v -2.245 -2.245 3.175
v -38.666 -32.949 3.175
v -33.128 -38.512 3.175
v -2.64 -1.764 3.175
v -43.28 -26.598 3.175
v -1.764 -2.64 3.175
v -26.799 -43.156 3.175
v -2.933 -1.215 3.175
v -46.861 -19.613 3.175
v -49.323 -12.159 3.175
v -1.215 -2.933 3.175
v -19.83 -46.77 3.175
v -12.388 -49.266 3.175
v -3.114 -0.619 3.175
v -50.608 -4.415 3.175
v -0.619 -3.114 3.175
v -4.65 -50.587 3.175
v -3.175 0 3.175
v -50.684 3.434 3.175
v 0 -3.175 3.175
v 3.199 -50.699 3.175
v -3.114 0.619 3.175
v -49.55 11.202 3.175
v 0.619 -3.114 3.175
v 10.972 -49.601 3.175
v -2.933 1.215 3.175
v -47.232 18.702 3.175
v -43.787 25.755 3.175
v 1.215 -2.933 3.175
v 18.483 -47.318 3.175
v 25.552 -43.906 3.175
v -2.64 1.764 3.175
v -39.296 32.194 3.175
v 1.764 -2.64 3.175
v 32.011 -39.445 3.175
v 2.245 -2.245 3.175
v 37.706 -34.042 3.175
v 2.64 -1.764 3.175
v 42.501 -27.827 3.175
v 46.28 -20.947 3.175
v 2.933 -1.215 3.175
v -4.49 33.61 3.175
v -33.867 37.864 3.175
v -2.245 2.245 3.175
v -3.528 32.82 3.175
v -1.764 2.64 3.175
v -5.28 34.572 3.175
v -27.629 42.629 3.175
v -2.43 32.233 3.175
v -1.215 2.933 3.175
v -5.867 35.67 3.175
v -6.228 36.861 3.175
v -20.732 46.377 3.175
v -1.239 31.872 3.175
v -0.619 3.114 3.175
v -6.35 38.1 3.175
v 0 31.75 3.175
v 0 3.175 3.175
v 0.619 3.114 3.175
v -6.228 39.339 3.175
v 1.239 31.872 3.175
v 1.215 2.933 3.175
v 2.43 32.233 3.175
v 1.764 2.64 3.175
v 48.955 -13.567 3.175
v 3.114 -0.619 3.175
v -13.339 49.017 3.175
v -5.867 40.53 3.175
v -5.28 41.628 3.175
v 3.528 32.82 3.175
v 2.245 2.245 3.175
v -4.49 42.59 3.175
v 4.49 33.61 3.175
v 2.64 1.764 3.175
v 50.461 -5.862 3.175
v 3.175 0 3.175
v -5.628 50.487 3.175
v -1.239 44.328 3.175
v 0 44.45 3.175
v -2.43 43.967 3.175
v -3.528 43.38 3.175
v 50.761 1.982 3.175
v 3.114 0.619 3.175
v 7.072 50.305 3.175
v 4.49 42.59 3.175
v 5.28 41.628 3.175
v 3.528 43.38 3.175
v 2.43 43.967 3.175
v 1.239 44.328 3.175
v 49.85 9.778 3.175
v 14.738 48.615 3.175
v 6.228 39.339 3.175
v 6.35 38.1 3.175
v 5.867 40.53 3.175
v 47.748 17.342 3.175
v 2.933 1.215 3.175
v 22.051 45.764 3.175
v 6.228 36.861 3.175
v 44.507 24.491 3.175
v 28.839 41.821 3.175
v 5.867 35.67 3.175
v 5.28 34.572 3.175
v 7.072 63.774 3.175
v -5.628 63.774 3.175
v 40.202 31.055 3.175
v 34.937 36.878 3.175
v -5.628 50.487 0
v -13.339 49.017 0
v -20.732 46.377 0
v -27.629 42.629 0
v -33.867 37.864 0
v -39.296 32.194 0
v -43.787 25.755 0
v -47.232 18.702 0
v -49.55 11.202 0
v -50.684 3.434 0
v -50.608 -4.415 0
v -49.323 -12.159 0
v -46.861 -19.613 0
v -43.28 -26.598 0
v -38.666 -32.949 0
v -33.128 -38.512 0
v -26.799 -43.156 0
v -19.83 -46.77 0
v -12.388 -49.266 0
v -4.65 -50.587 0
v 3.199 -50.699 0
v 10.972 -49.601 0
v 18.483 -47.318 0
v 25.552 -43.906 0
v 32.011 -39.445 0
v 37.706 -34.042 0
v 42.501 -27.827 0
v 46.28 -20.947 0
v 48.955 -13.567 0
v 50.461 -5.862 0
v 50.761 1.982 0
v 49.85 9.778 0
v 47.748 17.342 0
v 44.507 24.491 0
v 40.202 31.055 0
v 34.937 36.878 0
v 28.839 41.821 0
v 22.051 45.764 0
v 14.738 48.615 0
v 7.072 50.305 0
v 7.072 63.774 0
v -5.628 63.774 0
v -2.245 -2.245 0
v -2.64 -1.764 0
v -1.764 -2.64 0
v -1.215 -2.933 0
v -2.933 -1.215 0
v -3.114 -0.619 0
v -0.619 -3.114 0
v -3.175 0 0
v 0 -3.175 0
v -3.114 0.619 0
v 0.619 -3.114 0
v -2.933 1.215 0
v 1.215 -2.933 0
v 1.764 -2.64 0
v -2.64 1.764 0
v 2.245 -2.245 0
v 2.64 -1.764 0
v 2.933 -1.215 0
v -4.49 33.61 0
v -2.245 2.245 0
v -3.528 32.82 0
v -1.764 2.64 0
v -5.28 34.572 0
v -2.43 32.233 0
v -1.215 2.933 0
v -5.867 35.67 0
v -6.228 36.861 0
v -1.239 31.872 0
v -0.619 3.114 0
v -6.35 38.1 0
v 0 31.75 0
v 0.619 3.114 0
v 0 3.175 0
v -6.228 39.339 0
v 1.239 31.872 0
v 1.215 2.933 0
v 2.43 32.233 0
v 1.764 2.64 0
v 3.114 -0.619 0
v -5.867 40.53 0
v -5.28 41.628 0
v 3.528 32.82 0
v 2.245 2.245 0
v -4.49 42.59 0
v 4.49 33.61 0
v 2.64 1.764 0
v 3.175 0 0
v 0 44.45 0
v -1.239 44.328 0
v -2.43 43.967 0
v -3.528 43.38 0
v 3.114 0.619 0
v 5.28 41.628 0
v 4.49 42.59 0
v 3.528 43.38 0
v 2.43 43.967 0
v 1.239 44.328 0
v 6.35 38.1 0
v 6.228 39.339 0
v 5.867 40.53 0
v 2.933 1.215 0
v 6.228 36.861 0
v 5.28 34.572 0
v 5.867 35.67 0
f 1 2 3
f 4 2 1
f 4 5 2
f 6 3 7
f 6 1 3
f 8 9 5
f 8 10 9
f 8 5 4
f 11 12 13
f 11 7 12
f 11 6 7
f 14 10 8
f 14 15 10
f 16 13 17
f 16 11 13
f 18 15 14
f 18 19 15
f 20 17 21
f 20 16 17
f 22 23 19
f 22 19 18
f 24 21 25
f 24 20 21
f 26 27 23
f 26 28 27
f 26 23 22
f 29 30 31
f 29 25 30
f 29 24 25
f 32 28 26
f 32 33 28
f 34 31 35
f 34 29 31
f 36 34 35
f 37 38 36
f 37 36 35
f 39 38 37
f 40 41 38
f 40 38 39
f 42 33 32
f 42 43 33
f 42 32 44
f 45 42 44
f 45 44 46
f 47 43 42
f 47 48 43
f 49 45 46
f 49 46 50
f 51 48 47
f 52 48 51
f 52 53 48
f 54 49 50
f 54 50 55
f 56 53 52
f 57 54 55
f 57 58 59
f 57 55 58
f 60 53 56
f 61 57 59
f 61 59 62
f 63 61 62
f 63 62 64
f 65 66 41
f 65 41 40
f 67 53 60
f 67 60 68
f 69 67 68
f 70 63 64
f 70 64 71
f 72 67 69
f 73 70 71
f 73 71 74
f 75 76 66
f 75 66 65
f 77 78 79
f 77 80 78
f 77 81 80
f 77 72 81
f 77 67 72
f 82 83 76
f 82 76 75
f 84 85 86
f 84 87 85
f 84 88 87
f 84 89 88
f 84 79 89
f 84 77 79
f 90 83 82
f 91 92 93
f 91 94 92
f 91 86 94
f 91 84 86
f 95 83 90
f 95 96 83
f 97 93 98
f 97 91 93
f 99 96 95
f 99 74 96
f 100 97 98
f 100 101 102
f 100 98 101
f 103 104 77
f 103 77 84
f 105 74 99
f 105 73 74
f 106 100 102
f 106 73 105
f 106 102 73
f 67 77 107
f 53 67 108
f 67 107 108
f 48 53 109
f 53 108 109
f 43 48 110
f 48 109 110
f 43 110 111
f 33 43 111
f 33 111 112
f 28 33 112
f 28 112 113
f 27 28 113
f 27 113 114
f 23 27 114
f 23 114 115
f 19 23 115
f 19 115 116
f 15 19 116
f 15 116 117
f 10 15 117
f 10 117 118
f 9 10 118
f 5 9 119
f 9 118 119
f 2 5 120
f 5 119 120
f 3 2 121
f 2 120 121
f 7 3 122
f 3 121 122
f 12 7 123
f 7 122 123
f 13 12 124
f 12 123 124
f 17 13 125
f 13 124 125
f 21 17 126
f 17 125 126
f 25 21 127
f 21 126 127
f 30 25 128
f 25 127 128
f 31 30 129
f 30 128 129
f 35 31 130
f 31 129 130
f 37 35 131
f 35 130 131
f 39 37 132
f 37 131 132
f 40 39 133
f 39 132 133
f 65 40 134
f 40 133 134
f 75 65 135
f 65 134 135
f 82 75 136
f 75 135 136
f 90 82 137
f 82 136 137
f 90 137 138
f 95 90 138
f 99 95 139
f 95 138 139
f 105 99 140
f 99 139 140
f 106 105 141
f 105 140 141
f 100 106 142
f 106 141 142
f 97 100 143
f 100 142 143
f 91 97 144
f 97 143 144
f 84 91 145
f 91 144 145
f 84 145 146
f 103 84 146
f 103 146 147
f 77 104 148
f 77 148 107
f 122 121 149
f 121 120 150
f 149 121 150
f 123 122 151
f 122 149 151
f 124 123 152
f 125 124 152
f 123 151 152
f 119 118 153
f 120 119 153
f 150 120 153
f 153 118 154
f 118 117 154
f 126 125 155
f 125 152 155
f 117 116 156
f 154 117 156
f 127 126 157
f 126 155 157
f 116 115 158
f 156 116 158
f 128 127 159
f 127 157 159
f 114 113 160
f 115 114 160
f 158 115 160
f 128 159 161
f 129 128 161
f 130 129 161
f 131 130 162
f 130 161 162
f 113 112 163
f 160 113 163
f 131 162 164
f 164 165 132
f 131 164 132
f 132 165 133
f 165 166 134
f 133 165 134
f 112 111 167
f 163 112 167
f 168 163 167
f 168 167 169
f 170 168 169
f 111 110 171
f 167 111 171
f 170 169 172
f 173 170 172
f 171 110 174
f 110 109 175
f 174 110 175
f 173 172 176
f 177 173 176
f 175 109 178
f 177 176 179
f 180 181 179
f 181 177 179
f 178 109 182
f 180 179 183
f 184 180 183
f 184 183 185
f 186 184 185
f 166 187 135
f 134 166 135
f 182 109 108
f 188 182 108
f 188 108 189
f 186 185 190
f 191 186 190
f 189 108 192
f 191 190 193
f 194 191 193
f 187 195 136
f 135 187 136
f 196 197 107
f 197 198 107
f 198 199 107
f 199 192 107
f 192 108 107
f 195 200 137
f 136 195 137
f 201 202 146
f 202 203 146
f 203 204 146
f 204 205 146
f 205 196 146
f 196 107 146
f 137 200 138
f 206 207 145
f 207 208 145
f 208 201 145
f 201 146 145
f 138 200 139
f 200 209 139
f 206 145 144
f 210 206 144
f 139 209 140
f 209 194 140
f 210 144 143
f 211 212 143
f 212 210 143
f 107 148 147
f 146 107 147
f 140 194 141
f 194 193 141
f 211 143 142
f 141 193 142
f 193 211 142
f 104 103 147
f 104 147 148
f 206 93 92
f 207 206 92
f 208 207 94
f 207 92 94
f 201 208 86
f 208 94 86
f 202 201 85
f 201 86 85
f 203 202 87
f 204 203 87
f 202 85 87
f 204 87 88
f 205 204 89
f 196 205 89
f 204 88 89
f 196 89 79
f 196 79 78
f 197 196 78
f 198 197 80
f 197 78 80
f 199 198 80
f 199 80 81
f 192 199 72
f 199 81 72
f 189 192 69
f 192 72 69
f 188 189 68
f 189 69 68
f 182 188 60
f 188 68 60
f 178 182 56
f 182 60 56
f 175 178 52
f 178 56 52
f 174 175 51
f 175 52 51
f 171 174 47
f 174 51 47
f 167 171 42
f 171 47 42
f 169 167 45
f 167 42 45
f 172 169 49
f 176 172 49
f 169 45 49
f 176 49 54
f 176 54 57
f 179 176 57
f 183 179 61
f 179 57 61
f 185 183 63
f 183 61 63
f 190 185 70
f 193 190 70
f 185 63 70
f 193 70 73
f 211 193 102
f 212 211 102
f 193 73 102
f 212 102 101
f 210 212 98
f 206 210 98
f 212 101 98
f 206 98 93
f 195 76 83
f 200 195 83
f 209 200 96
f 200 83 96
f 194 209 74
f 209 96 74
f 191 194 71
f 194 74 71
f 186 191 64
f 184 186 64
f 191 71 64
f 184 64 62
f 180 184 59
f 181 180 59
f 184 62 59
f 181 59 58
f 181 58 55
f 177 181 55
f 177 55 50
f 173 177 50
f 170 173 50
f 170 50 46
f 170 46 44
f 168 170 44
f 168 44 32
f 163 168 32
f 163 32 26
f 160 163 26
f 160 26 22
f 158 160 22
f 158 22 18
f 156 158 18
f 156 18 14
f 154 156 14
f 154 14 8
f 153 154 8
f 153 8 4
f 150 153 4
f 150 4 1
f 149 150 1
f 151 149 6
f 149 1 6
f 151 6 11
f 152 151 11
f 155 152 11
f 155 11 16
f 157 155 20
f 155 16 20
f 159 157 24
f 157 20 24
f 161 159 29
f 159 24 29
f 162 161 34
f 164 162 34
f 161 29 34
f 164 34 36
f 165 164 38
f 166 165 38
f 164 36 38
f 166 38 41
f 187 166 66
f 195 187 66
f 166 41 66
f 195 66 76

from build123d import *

# Parameters (mm, degrees)
F0_R     = 50.8
F1_DEPTH = 3.175
F2_R     = 6.35
F3_DEPTH = 3.175
F4_R     = 3.175
F5_DEPTH = 25.4
F7_DEPTH = 3.175


with BuildPart() as f1:
    # F0 (on Top) → F1 (new body)
    with BuildSketch(Plane.XY):
        Circle(F0_R)
    extrude(amount=F1_DEPTH)

    # F2 (on face) → F3 (cut)
    with BuildSketch(Plane.XY.offset(3.175)):
        with Locations((0, 38.1)):
            Circle(F2_R)
    extrude(amount=-F3_DEPTH, mode=Mode.SUBTRACT)

    # F4 (on face) → F5 (cut)
    with BuildSketch(Plane.XY.offset(3.175)):
        Circle(F4_R)
    extrude(amount=-F5_DEPTH, mode=Mode.SUBTRACT)

    # F6 (on face) → F7 (join)
    with BuildSketch(Plane.XY.offset(3.175)):
        with BuildLine():
            Line((-5.628267, 63.773812), (-5.628267, 50.487252))
            ThreePointArc((-5.628267, 50.487252), (0.72744, 50.794791), (7.071733, 50.305373))
            Line((7.071733, 50.305373), (7.071733, 63.773812))
            Line((7.071733, 63.773812), (-5.628267, 63.773812))
        make_face()
    extrude(amount=-F7_DEPTH)


solid = f1.part
